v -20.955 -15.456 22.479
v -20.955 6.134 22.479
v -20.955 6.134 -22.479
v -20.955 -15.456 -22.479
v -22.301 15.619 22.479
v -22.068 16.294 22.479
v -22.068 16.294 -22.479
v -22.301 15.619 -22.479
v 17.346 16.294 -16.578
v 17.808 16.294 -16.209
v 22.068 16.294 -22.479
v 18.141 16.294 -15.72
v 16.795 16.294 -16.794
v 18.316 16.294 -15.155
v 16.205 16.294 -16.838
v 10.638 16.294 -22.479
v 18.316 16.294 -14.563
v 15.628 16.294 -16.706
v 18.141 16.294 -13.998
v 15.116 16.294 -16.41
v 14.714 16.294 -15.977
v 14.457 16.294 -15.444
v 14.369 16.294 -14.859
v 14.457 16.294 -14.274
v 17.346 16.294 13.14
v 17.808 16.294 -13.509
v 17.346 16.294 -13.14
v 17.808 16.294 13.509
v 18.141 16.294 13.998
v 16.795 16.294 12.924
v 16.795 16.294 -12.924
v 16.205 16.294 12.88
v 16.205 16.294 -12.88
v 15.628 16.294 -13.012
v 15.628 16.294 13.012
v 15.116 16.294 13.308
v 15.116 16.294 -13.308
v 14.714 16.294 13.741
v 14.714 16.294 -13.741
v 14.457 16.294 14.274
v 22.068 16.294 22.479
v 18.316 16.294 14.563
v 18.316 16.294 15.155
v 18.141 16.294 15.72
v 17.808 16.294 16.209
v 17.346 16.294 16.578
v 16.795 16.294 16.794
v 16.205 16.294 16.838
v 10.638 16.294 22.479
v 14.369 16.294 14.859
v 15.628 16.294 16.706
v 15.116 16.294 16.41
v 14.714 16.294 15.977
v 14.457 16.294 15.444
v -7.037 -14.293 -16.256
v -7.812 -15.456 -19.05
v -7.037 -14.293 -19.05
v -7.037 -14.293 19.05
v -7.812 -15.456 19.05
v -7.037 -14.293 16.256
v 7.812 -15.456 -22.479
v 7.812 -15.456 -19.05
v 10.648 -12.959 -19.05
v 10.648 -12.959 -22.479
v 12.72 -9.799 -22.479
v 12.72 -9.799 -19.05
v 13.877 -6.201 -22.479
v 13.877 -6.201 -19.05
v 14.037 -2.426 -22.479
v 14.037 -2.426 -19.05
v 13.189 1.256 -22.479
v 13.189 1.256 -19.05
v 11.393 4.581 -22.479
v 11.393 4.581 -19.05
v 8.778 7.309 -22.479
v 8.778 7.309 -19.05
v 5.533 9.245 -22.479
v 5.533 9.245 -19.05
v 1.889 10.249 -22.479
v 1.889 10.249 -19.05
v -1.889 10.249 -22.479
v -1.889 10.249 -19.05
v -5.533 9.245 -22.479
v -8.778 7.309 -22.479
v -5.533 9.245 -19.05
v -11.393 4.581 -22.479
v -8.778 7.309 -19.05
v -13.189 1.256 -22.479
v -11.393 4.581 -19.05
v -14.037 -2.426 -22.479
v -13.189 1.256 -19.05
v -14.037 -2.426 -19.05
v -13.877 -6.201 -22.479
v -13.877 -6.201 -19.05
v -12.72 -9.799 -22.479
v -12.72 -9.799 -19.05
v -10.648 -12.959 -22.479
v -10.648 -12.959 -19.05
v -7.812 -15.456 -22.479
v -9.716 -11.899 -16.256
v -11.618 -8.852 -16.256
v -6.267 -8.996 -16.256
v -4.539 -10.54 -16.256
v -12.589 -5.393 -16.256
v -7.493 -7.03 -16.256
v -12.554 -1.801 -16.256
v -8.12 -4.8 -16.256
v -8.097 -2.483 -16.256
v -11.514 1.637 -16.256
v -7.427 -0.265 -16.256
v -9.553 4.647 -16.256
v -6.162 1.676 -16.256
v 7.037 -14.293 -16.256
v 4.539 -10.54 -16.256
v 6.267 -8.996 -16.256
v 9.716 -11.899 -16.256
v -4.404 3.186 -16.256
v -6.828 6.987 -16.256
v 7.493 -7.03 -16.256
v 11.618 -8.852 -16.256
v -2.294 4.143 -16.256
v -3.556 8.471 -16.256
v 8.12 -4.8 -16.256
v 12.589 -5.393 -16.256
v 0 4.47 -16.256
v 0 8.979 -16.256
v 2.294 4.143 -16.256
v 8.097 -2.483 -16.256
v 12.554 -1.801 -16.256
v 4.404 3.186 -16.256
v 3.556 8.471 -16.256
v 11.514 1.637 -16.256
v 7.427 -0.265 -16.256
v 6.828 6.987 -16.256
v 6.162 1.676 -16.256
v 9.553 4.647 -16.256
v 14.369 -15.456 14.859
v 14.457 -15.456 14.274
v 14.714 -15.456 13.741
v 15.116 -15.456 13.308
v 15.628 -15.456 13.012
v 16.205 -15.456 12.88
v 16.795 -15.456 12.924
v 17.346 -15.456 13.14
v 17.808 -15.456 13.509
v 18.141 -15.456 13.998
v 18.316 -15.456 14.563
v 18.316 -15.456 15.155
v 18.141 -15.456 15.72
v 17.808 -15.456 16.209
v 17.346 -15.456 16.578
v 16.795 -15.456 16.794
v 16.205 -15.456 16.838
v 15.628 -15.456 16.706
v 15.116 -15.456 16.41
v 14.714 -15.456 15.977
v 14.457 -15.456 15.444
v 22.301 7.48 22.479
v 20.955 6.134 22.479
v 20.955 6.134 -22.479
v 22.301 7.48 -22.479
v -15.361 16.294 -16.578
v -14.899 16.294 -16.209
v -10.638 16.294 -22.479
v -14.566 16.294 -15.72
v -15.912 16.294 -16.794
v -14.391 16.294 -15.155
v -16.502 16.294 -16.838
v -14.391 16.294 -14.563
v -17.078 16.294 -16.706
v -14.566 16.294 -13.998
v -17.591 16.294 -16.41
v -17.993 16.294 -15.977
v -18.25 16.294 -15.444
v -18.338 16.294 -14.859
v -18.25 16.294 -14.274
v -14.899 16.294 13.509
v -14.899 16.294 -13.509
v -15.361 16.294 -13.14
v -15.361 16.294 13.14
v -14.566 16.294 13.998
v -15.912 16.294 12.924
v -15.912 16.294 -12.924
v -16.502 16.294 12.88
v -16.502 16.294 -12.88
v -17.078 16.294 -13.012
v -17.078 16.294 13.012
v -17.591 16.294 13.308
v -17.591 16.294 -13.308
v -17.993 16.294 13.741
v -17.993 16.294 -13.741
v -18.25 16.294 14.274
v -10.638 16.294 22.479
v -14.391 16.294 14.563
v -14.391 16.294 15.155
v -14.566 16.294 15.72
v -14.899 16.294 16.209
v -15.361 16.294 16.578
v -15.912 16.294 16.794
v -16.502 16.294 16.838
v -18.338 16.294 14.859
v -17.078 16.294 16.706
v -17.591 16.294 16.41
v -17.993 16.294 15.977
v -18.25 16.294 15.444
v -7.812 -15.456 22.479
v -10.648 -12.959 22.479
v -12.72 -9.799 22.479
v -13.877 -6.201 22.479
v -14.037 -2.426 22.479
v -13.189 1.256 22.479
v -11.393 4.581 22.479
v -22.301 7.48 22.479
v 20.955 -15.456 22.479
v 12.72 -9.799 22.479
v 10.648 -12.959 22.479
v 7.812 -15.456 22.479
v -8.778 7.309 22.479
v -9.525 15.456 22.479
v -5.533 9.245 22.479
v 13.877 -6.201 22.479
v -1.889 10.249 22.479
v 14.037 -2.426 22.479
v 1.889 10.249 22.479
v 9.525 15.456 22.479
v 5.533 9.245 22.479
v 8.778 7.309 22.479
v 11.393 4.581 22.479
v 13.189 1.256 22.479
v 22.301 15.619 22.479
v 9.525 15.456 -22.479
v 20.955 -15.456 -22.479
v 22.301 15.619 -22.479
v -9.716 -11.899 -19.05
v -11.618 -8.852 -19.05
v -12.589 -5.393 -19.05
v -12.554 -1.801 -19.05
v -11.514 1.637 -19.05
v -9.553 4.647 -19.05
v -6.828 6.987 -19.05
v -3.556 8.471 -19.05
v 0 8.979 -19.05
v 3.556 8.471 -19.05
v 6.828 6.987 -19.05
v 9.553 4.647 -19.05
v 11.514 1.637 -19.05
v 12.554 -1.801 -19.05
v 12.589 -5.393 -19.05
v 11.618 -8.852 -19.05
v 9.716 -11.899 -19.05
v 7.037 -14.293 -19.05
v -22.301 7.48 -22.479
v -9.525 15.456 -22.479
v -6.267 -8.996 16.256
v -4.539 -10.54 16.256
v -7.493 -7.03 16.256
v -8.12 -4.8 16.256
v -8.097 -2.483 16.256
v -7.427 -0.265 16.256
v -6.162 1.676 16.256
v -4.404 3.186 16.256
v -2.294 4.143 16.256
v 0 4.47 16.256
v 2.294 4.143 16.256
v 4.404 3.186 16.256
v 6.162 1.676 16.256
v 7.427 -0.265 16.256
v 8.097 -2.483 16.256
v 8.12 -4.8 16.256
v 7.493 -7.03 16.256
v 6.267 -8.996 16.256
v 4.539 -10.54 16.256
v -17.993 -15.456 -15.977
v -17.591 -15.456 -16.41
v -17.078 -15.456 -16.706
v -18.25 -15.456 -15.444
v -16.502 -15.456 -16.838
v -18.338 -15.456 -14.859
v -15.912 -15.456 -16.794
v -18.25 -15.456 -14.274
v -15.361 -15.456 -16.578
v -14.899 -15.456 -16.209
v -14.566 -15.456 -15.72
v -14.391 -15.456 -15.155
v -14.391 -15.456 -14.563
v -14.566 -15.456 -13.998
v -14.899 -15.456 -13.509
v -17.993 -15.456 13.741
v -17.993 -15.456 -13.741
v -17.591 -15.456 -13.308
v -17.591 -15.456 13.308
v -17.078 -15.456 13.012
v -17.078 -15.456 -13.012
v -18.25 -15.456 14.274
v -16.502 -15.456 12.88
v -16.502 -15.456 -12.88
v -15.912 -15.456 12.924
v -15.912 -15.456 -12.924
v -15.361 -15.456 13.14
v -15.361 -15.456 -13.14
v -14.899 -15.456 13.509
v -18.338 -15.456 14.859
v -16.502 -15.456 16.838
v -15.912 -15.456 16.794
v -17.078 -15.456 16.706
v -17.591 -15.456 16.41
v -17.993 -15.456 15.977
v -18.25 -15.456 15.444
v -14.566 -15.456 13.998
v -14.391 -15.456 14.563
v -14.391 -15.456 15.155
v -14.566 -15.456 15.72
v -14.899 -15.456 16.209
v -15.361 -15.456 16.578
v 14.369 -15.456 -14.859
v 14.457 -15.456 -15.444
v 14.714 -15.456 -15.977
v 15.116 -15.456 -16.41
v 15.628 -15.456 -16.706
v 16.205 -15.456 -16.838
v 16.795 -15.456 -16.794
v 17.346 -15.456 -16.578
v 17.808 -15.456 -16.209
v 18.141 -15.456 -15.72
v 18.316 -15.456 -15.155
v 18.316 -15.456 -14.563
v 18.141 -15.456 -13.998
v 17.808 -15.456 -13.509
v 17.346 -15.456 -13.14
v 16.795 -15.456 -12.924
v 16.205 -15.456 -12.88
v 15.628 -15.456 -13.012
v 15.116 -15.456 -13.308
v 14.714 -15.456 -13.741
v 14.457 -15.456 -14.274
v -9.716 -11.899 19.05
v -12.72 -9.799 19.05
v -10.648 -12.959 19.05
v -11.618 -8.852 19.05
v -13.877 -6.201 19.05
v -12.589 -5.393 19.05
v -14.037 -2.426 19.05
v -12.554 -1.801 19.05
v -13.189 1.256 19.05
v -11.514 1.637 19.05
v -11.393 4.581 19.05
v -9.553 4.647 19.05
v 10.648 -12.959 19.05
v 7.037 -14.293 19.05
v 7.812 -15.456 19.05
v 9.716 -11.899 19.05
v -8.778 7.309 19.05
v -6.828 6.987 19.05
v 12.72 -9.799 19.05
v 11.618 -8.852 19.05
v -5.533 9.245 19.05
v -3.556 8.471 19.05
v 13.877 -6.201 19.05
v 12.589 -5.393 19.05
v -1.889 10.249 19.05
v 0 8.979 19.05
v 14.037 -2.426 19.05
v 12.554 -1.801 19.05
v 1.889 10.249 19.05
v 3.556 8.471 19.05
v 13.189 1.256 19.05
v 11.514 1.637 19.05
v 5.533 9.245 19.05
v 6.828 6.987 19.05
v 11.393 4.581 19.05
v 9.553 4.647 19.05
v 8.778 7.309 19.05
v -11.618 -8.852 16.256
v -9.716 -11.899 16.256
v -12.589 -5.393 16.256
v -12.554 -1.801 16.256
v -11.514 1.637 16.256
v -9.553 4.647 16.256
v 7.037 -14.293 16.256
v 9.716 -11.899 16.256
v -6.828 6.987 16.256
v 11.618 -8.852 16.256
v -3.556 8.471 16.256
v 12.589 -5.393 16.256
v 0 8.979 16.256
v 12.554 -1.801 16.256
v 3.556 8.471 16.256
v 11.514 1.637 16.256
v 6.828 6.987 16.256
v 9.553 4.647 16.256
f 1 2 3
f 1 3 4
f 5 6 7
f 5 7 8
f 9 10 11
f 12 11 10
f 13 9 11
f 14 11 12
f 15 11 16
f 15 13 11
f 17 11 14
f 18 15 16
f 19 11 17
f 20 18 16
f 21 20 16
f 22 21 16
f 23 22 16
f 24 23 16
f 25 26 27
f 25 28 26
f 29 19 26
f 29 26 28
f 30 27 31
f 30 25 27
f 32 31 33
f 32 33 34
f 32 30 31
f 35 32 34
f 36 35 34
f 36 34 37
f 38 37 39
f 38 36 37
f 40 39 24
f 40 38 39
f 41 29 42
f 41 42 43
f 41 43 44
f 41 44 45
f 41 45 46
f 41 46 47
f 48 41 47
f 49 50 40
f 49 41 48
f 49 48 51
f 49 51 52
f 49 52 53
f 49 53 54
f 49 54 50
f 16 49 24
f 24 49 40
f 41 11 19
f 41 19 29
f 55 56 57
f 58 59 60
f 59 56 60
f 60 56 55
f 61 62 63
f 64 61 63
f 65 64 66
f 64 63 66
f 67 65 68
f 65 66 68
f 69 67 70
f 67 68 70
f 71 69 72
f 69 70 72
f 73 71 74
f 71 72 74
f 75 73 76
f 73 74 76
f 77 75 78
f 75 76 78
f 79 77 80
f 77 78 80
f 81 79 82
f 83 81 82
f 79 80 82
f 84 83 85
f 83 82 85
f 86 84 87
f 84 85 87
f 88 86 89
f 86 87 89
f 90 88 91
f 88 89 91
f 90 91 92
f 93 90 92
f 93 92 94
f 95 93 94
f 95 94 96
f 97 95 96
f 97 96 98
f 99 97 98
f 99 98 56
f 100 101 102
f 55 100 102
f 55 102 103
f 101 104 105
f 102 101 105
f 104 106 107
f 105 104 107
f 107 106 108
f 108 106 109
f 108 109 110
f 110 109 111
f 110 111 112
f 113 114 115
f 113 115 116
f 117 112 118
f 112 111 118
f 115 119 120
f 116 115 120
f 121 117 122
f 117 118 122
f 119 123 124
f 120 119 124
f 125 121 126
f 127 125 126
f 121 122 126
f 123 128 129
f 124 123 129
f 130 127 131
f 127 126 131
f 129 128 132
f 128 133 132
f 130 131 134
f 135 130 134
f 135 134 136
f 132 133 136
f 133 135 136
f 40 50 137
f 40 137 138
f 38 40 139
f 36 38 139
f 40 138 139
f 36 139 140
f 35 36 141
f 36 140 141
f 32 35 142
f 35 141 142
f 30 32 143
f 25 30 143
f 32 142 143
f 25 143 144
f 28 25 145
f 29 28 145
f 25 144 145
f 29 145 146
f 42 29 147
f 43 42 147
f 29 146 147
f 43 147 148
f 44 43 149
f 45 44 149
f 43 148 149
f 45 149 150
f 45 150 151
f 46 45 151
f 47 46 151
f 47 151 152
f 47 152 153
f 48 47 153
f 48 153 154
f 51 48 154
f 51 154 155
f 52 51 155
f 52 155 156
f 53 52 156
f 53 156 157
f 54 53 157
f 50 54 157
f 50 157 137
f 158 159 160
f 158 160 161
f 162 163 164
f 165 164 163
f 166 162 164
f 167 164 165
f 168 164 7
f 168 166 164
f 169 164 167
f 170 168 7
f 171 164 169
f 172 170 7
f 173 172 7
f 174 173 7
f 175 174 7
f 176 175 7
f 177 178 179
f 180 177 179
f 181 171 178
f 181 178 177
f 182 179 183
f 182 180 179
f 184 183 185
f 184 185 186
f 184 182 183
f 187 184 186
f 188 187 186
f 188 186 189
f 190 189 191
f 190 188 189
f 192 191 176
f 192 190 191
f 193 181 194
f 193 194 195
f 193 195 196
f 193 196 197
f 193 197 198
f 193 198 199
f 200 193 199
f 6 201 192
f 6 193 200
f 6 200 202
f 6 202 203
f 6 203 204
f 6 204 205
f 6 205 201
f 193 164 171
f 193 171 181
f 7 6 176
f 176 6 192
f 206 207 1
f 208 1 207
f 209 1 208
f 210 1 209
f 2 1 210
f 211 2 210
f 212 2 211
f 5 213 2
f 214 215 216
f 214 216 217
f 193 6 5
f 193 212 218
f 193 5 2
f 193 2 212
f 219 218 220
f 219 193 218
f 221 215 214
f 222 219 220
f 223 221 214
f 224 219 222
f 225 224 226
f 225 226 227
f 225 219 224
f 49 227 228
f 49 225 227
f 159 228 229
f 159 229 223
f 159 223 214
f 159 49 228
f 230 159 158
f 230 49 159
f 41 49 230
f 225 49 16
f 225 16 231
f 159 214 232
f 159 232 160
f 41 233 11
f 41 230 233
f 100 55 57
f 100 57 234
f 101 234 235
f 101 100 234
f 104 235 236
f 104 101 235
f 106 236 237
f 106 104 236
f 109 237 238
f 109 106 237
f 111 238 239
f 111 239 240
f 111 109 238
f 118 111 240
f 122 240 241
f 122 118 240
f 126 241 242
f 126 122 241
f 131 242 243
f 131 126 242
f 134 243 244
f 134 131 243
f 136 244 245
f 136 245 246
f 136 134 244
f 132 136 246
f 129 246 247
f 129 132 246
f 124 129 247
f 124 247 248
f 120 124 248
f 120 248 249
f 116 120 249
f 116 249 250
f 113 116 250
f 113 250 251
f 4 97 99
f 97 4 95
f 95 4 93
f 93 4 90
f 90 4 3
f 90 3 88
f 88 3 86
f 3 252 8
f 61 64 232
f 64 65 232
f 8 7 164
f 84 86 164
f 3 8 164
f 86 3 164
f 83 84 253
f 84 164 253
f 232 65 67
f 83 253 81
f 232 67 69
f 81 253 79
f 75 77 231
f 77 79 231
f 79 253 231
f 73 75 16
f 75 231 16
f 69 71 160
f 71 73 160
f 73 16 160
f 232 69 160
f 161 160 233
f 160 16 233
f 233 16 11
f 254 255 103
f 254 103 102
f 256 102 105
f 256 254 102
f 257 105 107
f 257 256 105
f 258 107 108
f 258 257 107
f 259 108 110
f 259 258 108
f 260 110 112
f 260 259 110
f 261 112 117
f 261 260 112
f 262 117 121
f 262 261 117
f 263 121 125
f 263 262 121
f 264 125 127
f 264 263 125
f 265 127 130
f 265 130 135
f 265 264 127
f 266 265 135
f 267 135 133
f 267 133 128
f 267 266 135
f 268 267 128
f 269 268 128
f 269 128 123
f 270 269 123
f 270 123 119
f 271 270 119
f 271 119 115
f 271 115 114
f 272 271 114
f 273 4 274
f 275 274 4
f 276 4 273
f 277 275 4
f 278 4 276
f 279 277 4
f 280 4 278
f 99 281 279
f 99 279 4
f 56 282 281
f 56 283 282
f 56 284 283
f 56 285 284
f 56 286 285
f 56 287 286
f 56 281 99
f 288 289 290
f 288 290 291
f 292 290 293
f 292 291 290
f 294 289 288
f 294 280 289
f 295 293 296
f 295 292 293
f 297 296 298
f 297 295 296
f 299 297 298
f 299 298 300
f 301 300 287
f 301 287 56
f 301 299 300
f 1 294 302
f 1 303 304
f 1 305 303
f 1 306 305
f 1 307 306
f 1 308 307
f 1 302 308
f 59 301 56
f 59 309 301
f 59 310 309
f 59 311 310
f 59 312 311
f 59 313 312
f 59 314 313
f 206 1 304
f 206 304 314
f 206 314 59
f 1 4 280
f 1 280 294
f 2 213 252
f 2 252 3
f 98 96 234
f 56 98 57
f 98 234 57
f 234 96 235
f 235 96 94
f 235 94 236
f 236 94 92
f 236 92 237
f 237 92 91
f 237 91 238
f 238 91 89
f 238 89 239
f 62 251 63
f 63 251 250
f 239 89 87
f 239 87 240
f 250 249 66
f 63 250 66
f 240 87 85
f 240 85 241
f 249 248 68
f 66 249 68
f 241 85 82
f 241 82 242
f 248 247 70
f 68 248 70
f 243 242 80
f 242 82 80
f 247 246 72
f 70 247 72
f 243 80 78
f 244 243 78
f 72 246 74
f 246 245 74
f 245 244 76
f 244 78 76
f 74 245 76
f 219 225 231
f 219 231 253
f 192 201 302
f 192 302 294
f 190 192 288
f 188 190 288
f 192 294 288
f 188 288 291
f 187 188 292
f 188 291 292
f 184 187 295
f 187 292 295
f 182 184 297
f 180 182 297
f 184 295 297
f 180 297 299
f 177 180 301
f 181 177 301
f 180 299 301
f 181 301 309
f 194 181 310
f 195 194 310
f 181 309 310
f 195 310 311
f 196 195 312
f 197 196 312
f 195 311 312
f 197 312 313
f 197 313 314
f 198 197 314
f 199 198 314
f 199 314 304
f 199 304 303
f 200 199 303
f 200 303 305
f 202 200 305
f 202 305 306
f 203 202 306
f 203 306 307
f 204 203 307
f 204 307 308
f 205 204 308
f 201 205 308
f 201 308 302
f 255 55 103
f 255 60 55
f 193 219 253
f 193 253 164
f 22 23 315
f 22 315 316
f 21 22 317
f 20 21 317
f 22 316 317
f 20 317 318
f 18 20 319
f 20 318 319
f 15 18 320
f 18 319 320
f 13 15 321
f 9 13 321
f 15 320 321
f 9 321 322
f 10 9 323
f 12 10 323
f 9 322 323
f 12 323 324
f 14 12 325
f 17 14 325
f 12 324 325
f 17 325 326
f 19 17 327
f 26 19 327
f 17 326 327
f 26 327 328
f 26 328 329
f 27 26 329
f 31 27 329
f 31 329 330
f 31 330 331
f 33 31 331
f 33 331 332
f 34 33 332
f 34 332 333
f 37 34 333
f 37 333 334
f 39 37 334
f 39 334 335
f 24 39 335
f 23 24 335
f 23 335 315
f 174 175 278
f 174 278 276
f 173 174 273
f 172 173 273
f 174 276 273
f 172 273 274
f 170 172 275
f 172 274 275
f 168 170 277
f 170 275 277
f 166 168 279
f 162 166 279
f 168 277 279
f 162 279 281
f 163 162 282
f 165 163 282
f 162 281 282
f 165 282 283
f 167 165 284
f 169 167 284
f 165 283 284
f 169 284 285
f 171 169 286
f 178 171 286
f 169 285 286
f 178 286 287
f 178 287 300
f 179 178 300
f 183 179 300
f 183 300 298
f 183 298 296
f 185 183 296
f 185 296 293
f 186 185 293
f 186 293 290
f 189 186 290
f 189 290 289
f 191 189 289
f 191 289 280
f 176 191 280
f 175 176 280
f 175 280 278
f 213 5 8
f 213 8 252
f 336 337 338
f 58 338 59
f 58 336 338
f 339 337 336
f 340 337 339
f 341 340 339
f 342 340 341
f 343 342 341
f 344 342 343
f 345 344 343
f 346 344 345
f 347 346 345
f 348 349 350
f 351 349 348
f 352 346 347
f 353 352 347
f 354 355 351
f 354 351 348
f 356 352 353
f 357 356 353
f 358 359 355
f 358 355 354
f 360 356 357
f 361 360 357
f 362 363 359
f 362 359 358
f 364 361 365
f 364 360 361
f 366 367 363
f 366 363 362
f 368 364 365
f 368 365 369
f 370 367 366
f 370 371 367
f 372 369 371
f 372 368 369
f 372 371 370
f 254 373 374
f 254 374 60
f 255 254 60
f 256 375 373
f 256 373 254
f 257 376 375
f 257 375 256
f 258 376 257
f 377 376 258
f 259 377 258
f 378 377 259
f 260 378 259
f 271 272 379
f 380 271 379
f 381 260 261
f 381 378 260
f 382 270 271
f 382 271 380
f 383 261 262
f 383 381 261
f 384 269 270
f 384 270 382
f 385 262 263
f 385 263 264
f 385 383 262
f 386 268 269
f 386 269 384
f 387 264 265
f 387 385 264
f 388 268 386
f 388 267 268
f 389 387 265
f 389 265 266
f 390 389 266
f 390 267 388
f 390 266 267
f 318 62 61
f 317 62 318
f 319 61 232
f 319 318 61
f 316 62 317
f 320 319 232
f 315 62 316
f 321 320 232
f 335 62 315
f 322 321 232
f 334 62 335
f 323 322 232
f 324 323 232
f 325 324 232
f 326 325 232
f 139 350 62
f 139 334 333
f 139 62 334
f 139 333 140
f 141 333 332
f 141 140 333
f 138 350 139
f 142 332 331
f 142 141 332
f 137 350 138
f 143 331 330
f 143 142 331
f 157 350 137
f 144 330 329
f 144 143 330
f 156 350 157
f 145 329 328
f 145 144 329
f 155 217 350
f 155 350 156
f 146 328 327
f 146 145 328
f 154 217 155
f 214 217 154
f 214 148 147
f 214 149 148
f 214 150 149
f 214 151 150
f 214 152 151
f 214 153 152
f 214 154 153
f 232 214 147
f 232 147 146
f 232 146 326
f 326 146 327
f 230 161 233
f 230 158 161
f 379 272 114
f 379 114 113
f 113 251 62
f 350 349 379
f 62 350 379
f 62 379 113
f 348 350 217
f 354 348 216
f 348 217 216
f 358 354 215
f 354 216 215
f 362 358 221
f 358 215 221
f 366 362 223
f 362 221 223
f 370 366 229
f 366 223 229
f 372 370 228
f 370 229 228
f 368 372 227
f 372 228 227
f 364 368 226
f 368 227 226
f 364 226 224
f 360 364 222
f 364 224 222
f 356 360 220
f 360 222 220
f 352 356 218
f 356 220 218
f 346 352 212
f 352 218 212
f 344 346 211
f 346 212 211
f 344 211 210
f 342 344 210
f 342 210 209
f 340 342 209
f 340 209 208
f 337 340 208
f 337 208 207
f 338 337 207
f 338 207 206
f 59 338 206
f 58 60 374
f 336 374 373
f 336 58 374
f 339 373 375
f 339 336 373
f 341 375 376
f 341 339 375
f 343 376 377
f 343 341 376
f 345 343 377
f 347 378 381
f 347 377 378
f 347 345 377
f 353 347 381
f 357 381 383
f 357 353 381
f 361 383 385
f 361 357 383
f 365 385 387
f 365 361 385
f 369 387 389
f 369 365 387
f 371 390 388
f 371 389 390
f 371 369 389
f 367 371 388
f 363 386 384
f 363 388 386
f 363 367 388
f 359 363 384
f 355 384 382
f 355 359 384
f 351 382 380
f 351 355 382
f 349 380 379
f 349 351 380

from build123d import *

# Parameters (mm, degrees)
BOSS_EXTRUDE1_DEPTH                 = 22.479
F_5_32_0_15625_DIAMETER_HOLE1_D     = 3.96875
F_5_32_0_15625_DIAMETER_HOLE1_DEPTH = 31.75
SKETCH17_R                          = 14.097
CUT_EXTRUDE1_DEPTH                  = 1
CUT_EXTRUDE1_DEPTH_BACK             = 45.958
BOSS_EXTRUDE2_DEPTH                 = 19.05
BOSS_EXTRUDE3_DEPTH                 = 16.256


with BuildPart() as part:
    # Sketch2 → Boss-Extrude1 (new body, symmetric)
    with BuildSketch(Plane.XY):
        Polygon((22.06839298, 16.2941), (10.63839298, 16.2941), (9.525, 15.4559), (-9.525, 15.4559), (-10.63839298, 16.2941), (-22.06839298, 16.2941), (-22.3012, 15.619179923), (-22.3012, 7.4803), (-20.955, 6.1341), (-20.955, -15.4559), (20.955, -15.4559), (20.955, 6.1341), (22.3012, 7.4803), (22.3012, 15.619179923), align=None)
    extrude(amount=BOSS_EXTRUDE1_DEPTH, both=True)

    # 5/32 (0.15625) Diameter Hole1
    with Locations(Plane(origin=(0, 16.2941, 0), x_dir=(1, 0, 0), z_dir=(0, 1, 0))):
        with Locations((-16.35339298, 14.859), (-16.35339298, -14.859), (16.35339298, -14.859), (16.35339298, 14.859)):
            Hole(F_5_32_0_15625_DIAMETER_HOLE1_D / 2, depth=F_5_32_0_15625_DIAMETER_HOLE1_DEPTH)

    # Sketch17 → Cut-Extrude1 (cut, two sides)
    with BuildSketch(Plane.XY.offset(22.479)) as cut_extrude1_sk:
        with Locations((0, -3.7211)):
            Circle(SKETCH17_R)
    extrude(amount=CUT_EXTRUDE1_DEPTH, mode=Mode.SUBTRACT)
    extrude(cut_extrude1_sk.sketch, amount=-CUT_EXTRUDE1_DEPTH_BACK, mode=Mode.SUBTRACT)

    # Sketch18 → Boss-Extrude2 (add, symmetric)
    with BuildSketch(Plane.XY):
        with BuildLine():
            Line((-7.811522128, -15.4559), (-7.037407323, -14.292991892))
            ThreePointArc((-7.037407323, -14.292991892), (0, 8.9789), (7.037407323, -14.292991892))
            Line((7.037407323, -14.292991892), (7.811522128, -15.4559))
            ThreePointArc((7.811522128, -15.4559), (0, 10.3759), (-7.811522128, -15.4559))
        make_face()
    extrude(amount=BOSS_EXTRUDE2_DEPTH, both=True)

    # Sketch19 → Boss-Extrude3 (add, symmetric)
    with BuildSketch(Plane.XY):
        with BuildLine():
            Line((-7.037407323, -14.292991892), (-4.539127723, -10.53997027))
            ThreePointArc((-4.539127723, -10.53997027), (0, 4.4704), (4.539127723, -10.53997027))
            Line((4.539127723, -10.53997027), (7.037407323, -14.292991892))
            ThreePointArc((7.037407323, -14.292991892), (0, 8.9789), (-7.037407323, -14.292991892))
        make_face()
    extrude(amount=BOSS_EXTRUDE3_DEPTH, both=True)


solid = part.part
